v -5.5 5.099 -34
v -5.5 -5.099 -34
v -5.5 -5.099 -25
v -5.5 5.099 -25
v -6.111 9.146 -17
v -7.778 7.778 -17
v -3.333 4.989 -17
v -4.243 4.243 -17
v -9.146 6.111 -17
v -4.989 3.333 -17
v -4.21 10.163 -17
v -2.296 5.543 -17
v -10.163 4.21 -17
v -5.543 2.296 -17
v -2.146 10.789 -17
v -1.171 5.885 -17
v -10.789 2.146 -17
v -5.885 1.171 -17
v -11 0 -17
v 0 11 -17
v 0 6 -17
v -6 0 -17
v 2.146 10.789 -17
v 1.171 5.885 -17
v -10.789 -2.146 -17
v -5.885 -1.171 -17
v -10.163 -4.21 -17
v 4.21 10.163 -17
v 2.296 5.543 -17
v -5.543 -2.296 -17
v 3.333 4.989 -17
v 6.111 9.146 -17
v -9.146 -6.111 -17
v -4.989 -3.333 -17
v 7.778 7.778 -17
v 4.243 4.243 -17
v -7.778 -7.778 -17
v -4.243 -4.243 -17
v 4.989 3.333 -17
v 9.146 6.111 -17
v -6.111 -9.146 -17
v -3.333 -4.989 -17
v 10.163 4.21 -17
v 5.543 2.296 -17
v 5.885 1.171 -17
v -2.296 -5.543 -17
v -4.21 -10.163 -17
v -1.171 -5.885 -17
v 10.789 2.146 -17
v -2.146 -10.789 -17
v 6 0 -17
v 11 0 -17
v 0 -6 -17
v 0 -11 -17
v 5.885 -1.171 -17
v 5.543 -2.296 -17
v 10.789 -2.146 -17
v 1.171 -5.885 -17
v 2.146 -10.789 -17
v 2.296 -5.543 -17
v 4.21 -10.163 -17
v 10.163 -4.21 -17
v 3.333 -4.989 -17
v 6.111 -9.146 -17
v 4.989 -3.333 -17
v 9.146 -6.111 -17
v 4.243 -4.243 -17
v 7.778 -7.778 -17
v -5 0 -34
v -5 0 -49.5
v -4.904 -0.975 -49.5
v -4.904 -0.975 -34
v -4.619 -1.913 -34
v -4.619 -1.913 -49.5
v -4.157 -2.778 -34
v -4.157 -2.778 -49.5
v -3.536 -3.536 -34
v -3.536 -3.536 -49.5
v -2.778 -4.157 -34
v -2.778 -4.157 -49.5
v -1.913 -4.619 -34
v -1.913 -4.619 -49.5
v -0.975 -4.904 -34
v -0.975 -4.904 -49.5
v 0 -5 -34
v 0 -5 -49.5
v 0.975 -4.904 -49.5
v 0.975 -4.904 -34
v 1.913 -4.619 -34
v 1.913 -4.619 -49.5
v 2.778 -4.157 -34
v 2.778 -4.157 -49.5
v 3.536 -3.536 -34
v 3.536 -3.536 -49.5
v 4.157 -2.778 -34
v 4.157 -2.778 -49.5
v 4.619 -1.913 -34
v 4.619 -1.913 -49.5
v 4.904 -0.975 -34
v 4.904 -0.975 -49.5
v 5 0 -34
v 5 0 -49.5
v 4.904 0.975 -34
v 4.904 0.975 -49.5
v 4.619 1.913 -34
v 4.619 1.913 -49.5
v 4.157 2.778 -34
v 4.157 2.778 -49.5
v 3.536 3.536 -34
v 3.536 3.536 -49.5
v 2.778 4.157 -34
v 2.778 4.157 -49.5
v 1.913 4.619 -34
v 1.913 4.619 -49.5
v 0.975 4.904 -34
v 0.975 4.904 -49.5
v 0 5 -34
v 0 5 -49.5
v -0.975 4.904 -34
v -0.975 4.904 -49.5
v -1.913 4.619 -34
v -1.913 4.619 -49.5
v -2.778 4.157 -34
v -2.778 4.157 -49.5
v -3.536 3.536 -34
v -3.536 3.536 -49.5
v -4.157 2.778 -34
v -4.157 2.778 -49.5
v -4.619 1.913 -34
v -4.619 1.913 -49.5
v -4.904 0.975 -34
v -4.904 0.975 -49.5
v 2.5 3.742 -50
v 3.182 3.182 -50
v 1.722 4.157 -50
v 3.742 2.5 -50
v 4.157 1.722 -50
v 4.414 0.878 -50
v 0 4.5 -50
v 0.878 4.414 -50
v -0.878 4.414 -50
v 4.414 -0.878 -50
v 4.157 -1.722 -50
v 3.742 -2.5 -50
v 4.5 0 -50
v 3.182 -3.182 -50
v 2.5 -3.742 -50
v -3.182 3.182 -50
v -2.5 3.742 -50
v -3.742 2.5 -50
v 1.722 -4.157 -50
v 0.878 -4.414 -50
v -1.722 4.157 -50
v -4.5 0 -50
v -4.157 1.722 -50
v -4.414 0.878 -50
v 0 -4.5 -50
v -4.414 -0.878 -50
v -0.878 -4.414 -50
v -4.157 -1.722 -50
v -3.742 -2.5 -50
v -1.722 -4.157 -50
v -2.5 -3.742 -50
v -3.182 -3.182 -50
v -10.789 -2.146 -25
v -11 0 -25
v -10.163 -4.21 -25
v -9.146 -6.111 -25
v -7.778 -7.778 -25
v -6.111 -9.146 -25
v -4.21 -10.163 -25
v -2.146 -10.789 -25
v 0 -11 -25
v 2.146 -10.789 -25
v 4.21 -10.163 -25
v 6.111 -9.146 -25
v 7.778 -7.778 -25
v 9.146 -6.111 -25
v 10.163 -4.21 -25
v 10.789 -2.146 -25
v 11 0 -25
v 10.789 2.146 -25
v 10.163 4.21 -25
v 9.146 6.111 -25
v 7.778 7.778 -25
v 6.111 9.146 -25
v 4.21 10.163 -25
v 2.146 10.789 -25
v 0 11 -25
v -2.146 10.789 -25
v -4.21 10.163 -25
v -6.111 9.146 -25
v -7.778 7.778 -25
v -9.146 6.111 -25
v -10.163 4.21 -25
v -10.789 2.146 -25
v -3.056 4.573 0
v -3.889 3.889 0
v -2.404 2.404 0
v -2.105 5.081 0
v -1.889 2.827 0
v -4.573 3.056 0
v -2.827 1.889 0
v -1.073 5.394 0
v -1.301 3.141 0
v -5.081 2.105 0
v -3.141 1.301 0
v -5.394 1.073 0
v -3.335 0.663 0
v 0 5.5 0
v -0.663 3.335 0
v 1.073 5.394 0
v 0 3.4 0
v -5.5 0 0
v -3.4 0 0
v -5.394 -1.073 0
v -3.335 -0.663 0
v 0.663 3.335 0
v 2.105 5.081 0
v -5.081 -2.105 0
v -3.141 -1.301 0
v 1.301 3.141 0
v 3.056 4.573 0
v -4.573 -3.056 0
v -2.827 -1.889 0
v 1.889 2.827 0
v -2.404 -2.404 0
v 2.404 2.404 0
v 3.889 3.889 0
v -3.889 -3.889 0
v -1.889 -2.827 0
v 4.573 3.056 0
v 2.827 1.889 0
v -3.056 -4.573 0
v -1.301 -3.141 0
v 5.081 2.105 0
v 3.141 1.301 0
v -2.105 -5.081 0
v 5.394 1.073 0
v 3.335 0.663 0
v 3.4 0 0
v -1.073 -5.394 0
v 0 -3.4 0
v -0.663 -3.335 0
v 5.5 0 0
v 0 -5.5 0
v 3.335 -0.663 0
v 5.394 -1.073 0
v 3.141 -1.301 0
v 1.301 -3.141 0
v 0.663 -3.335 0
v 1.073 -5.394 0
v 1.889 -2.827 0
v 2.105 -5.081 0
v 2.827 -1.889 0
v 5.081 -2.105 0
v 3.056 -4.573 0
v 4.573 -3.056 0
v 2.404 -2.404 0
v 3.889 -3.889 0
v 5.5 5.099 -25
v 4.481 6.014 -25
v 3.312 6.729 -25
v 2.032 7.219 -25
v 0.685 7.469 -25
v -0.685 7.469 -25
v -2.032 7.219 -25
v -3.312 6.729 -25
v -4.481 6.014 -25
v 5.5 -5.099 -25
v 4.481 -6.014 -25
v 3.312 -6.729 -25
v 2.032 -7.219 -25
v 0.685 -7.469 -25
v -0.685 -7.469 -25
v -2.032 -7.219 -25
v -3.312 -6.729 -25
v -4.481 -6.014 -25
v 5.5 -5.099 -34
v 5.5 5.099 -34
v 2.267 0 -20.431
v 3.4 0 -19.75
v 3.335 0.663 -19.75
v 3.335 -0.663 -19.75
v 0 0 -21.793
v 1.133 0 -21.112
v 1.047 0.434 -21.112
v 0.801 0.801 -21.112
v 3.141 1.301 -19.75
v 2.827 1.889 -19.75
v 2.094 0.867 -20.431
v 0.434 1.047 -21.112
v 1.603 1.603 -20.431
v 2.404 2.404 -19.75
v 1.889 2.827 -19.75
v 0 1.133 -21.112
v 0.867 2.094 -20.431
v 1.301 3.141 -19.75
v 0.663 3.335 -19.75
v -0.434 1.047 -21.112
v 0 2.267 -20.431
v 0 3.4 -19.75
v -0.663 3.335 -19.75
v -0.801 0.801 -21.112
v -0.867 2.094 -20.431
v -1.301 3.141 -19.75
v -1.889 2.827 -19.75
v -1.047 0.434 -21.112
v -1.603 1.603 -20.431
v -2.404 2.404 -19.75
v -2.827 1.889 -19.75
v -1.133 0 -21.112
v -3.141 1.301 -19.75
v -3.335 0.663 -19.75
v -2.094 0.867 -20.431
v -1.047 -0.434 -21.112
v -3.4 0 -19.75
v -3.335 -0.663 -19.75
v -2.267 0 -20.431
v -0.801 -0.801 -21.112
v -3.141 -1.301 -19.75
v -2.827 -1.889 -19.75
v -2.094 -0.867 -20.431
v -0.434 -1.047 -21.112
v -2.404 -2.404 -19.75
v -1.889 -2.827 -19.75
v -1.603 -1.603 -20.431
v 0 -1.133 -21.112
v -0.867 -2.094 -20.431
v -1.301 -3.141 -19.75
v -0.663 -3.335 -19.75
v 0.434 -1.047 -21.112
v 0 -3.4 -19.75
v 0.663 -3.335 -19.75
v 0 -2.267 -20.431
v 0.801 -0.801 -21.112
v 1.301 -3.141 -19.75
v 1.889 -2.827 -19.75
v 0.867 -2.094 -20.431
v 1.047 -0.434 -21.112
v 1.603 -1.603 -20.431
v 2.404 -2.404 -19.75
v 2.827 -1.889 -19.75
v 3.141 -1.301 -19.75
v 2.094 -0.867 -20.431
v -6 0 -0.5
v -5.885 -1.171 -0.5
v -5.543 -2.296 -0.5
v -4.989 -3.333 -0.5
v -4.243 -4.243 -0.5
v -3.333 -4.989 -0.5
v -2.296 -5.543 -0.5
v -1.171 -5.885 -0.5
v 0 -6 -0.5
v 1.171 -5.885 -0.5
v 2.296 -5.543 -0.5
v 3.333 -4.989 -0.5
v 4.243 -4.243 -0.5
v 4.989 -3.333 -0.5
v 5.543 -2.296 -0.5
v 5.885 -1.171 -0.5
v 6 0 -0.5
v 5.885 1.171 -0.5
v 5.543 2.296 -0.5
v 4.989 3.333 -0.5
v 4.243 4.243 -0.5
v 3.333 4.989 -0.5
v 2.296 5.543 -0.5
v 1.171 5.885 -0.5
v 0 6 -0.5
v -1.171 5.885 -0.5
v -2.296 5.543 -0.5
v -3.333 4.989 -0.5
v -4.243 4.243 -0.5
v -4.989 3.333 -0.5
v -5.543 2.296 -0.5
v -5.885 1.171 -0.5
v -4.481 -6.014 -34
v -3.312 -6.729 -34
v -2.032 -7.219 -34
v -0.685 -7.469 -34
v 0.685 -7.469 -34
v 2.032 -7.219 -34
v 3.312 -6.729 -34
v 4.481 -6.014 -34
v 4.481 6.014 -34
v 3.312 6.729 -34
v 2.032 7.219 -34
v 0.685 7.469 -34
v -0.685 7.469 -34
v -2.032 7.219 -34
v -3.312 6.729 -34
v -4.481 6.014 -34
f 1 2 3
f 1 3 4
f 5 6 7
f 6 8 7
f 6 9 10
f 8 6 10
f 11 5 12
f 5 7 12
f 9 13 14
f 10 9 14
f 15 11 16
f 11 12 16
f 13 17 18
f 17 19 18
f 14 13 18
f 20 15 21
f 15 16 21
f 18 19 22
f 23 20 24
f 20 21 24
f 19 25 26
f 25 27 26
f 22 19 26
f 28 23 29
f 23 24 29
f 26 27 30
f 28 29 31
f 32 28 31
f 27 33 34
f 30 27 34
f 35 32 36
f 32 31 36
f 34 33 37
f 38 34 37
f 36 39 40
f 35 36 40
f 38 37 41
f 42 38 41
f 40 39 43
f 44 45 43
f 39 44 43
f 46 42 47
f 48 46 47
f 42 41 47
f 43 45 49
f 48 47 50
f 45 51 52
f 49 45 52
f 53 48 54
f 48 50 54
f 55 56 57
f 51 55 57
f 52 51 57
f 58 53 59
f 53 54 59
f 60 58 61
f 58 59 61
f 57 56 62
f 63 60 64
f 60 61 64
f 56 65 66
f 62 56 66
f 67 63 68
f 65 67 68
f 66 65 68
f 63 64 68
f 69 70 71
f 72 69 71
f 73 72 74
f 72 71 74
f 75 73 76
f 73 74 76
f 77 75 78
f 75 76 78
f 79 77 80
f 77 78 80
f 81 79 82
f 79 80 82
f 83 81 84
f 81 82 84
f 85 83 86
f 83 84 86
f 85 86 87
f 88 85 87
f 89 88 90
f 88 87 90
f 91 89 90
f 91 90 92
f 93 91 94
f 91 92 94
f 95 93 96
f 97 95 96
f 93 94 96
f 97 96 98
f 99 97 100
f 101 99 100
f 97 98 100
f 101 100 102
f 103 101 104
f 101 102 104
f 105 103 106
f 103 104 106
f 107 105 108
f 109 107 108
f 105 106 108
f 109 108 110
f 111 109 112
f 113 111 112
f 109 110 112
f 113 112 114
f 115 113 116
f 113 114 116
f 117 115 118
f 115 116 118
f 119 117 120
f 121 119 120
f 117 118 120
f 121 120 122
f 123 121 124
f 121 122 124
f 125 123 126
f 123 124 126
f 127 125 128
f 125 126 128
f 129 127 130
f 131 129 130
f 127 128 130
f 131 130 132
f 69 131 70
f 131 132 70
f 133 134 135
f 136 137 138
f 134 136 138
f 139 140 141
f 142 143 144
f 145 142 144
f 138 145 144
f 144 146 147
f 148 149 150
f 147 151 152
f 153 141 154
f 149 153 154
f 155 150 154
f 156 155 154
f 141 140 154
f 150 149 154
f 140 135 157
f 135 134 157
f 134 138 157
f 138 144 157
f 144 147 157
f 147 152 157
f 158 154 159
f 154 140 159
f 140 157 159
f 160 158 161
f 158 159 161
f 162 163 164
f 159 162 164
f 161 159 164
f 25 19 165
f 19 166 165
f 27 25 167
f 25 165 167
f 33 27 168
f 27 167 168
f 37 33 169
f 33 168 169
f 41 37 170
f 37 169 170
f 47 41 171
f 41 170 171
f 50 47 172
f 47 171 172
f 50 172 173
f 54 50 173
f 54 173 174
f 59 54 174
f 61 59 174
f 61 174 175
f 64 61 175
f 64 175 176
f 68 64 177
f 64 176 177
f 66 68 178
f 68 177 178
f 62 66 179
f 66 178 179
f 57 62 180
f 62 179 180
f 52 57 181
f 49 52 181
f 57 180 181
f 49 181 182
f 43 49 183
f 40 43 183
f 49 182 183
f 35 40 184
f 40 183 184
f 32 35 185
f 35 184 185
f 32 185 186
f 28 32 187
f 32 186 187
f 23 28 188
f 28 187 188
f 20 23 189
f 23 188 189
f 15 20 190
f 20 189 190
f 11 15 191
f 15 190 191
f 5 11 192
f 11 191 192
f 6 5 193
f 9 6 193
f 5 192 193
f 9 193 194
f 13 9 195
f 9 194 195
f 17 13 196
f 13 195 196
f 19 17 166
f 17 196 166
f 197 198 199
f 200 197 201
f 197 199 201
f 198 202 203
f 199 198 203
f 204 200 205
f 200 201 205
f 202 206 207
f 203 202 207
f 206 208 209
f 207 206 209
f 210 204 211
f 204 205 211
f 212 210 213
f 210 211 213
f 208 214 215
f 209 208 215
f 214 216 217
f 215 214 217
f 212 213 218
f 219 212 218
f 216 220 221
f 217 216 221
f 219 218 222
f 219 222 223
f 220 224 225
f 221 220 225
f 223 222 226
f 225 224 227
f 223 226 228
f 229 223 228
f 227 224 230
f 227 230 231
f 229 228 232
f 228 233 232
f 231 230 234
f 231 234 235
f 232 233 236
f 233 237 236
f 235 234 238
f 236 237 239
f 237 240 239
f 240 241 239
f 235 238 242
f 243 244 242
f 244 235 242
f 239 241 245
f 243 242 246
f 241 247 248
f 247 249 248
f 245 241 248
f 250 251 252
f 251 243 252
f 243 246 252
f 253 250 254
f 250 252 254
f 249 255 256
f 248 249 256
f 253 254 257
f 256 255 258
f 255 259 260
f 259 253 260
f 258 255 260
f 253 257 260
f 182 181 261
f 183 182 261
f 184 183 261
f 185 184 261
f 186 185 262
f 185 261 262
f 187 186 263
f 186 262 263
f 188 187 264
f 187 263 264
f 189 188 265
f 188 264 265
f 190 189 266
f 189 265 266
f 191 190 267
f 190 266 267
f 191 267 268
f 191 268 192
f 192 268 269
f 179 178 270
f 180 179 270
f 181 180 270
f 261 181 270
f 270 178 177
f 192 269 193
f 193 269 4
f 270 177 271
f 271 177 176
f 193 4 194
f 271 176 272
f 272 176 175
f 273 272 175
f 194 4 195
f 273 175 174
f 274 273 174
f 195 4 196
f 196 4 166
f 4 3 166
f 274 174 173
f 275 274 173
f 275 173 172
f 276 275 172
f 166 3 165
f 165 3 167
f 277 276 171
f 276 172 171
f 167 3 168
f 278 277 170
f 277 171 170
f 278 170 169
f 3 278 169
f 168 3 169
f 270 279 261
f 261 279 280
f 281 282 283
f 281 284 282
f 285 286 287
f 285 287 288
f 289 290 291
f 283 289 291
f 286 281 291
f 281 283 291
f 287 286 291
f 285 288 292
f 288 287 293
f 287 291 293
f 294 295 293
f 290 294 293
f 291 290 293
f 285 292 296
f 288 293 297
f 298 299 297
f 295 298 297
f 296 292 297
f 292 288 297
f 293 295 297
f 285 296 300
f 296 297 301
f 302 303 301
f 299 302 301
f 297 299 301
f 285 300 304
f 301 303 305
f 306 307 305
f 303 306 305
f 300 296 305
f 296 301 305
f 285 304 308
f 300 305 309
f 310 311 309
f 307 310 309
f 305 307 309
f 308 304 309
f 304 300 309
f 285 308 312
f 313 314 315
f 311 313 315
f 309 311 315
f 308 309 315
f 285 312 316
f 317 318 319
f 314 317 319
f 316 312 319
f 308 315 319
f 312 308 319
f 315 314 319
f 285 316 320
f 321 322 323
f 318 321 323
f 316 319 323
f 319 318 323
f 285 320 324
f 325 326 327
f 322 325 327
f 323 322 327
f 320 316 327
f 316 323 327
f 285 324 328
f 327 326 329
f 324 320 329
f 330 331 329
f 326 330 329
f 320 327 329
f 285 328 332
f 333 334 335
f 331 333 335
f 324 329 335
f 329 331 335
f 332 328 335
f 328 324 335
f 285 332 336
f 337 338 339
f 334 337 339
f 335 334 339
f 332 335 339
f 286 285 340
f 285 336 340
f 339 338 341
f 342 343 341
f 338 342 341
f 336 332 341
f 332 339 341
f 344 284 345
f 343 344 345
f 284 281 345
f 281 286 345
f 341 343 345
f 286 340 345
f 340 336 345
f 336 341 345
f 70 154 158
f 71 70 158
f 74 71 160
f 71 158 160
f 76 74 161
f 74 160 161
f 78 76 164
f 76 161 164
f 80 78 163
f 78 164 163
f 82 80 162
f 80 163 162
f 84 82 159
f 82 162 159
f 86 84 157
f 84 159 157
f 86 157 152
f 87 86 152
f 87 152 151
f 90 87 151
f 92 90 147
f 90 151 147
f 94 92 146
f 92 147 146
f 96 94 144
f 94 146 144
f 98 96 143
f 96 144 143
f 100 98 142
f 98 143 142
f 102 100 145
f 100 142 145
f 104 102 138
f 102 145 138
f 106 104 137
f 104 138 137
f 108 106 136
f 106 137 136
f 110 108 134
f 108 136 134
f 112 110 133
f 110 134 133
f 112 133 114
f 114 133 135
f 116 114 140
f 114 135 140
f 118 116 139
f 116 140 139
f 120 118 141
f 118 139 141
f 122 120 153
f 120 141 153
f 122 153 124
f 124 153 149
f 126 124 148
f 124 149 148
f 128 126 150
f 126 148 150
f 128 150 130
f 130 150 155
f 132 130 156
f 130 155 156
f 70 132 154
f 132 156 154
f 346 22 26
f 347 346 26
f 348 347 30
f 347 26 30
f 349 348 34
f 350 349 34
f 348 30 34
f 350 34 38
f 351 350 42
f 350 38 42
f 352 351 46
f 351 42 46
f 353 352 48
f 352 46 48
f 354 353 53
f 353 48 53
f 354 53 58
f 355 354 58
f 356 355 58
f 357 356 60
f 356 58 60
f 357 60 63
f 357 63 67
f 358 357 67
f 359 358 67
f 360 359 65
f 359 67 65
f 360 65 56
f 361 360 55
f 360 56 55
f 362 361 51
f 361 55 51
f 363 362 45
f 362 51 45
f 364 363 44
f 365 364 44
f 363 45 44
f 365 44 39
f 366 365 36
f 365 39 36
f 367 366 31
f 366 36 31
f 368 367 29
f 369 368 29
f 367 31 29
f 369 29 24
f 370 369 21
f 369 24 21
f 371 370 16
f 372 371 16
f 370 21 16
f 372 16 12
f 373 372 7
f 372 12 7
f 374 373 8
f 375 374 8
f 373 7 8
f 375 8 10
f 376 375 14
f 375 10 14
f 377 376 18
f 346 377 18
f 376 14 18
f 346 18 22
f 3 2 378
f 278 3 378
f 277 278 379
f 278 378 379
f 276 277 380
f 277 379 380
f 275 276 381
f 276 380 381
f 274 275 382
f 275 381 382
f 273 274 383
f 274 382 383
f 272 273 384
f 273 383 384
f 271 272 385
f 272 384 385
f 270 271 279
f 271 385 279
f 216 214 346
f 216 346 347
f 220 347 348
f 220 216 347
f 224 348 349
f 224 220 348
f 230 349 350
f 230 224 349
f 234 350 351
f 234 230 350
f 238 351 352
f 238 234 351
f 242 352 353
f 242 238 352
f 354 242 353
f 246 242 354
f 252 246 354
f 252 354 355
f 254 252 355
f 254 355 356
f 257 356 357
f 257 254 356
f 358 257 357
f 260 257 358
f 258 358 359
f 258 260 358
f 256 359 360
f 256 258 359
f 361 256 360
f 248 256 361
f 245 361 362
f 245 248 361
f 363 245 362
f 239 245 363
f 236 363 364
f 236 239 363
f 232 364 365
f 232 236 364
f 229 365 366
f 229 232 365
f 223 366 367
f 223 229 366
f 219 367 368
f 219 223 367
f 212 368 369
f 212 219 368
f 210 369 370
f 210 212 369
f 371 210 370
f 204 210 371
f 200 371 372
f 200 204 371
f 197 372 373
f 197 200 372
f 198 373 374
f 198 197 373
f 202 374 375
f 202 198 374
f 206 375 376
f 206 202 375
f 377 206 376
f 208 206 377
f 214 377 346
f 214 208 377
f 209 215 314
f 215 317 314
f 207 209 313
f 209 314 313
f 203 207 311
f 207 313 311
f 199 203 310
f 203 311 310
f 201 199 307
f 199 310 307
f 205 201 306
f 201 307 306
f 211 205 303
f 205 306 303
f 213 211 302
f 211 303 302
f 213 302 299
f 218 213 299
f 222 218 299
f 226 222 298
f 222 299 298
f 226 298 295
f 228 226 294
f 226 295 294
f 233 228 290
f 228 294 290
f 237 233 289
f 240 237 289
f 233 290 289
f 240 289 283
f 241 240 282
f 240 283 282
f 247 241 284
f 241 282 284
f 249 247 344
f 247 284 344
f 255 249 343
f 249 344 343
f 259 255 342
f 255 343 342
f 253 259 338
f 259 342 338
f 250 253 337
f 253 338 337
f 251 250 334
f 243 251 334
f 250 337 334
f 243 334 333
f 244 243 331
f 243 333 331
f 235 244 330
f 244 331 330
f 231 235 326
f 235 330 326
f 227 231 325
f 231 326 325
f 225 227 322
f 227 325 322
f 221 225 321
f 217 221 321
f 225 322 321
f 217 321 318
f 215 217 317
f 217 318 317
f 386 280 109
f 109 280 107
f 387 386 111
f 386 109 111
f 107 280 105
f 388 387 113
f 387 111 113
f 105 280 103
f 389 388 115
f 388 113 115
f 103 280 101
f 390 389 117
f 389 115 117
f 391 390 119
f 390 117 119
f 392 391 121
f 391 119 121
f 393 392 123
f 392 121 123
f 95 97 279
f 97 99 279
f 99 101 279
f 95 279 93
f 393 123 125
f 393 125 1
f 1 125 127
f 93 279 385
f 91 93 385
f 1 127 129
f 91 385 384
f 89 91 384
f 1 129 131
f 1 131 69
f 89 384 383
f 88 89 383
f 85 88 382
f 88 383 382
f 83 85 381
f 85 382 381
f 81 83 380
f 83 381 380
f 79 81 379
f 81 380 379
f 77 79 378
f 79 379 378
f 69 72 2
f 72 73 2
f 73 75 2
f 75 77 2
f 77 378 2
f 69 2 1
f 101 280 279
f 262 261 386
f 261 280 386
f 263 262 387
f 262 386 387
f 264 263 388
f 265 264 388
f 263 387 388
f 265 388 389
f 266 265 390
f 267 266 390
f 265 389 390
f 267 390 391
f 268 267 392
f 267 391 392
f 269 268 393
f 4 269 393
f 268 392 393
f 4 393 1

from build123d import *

# Parameters (mm, degrees)
SKETCH_2_OUTSIDE_W   = 35.778
SKETCH_2_OUTSIDE_H   = 35.778
SKETCH_2_OUTSIDE_W_2 = 11
SKETCH_2_OUTSIDE_H_2 = 17.627531483
CUT_EXTRUDE_1_DEPTH  = 9
M8X1_25_1_D          = 6.8
M8X1_25_1_DEPTH      = 19.75
M8X1_25_1_TIP        = 2.042926105
CHAMFER_1_SIZE       = 0.5


with BuildPart() as part:
    # 草图1 → 旋转1 (revolve)
    with BuildSketch(Plane(origin=(0, 0, 0), x_dir=(0, 0, -1), z_dir=(1, 0, 0)), mode=Mode.PRIVATE) as revolve_1_sk:
        Polygon((0, 6), (17, 6), (17, 11), (25, 11), (25, 7.5), (34, 7.5), (34, 5), (50, 5), (50, 0), (0, 0), align=None)
    revolve(revolve_1_sk.sketch.rotate(Axis((0, 0, -50), (0, 0, 1)), 90), axis=Axis((0, 0, -50), (0, 0, 1)))

    # 草图2 outside → 切除-拉伸1 (cut)
    with BuildSketch(Plane.XY.offset(-34)):
        Rectangle(SKETCH_2_OUTSIDE_W, SKETCH_2_OUTSIDE_H)
        with Locations((0, -0.228588755)):
            Rectangle(SKETCH_2_OUTSIDE_W_2, SKETCH_2_OUTSIDE_H_2, mode=Mode.SUBTRACT)
    extrude(amount=CUT_EXTRUDE_1_DEPTH, mode=Mode.SUBTRACT)

    # M8x1.25 螺纹孔1
    with Locations(Plane.XY):
        with Locations((0, 0)):
            Hole(M8X1_25_1_D / 2, depth=M8X1_25_1_DEPTH)
            with Locations((0, 0, -(M8X1_25_1_DEPTH + M8X1_25_1_TIP / 2))):  # 118° drill point
                Cone(0, M8X1_25_1_D / 2, M8X1_25_1_TIP, mode=Mode.SUBTRACT)

    # 倒角1
    chamfer_1_edges = [part.edges().sort_by_distance(p)[0] for p in [
        (6, 0, 0),
        (5, 0, -50),
    ]]
    chamfer(chamfer_1_edges, length=CHAMFER_1_SIZE)


solid = part.part
